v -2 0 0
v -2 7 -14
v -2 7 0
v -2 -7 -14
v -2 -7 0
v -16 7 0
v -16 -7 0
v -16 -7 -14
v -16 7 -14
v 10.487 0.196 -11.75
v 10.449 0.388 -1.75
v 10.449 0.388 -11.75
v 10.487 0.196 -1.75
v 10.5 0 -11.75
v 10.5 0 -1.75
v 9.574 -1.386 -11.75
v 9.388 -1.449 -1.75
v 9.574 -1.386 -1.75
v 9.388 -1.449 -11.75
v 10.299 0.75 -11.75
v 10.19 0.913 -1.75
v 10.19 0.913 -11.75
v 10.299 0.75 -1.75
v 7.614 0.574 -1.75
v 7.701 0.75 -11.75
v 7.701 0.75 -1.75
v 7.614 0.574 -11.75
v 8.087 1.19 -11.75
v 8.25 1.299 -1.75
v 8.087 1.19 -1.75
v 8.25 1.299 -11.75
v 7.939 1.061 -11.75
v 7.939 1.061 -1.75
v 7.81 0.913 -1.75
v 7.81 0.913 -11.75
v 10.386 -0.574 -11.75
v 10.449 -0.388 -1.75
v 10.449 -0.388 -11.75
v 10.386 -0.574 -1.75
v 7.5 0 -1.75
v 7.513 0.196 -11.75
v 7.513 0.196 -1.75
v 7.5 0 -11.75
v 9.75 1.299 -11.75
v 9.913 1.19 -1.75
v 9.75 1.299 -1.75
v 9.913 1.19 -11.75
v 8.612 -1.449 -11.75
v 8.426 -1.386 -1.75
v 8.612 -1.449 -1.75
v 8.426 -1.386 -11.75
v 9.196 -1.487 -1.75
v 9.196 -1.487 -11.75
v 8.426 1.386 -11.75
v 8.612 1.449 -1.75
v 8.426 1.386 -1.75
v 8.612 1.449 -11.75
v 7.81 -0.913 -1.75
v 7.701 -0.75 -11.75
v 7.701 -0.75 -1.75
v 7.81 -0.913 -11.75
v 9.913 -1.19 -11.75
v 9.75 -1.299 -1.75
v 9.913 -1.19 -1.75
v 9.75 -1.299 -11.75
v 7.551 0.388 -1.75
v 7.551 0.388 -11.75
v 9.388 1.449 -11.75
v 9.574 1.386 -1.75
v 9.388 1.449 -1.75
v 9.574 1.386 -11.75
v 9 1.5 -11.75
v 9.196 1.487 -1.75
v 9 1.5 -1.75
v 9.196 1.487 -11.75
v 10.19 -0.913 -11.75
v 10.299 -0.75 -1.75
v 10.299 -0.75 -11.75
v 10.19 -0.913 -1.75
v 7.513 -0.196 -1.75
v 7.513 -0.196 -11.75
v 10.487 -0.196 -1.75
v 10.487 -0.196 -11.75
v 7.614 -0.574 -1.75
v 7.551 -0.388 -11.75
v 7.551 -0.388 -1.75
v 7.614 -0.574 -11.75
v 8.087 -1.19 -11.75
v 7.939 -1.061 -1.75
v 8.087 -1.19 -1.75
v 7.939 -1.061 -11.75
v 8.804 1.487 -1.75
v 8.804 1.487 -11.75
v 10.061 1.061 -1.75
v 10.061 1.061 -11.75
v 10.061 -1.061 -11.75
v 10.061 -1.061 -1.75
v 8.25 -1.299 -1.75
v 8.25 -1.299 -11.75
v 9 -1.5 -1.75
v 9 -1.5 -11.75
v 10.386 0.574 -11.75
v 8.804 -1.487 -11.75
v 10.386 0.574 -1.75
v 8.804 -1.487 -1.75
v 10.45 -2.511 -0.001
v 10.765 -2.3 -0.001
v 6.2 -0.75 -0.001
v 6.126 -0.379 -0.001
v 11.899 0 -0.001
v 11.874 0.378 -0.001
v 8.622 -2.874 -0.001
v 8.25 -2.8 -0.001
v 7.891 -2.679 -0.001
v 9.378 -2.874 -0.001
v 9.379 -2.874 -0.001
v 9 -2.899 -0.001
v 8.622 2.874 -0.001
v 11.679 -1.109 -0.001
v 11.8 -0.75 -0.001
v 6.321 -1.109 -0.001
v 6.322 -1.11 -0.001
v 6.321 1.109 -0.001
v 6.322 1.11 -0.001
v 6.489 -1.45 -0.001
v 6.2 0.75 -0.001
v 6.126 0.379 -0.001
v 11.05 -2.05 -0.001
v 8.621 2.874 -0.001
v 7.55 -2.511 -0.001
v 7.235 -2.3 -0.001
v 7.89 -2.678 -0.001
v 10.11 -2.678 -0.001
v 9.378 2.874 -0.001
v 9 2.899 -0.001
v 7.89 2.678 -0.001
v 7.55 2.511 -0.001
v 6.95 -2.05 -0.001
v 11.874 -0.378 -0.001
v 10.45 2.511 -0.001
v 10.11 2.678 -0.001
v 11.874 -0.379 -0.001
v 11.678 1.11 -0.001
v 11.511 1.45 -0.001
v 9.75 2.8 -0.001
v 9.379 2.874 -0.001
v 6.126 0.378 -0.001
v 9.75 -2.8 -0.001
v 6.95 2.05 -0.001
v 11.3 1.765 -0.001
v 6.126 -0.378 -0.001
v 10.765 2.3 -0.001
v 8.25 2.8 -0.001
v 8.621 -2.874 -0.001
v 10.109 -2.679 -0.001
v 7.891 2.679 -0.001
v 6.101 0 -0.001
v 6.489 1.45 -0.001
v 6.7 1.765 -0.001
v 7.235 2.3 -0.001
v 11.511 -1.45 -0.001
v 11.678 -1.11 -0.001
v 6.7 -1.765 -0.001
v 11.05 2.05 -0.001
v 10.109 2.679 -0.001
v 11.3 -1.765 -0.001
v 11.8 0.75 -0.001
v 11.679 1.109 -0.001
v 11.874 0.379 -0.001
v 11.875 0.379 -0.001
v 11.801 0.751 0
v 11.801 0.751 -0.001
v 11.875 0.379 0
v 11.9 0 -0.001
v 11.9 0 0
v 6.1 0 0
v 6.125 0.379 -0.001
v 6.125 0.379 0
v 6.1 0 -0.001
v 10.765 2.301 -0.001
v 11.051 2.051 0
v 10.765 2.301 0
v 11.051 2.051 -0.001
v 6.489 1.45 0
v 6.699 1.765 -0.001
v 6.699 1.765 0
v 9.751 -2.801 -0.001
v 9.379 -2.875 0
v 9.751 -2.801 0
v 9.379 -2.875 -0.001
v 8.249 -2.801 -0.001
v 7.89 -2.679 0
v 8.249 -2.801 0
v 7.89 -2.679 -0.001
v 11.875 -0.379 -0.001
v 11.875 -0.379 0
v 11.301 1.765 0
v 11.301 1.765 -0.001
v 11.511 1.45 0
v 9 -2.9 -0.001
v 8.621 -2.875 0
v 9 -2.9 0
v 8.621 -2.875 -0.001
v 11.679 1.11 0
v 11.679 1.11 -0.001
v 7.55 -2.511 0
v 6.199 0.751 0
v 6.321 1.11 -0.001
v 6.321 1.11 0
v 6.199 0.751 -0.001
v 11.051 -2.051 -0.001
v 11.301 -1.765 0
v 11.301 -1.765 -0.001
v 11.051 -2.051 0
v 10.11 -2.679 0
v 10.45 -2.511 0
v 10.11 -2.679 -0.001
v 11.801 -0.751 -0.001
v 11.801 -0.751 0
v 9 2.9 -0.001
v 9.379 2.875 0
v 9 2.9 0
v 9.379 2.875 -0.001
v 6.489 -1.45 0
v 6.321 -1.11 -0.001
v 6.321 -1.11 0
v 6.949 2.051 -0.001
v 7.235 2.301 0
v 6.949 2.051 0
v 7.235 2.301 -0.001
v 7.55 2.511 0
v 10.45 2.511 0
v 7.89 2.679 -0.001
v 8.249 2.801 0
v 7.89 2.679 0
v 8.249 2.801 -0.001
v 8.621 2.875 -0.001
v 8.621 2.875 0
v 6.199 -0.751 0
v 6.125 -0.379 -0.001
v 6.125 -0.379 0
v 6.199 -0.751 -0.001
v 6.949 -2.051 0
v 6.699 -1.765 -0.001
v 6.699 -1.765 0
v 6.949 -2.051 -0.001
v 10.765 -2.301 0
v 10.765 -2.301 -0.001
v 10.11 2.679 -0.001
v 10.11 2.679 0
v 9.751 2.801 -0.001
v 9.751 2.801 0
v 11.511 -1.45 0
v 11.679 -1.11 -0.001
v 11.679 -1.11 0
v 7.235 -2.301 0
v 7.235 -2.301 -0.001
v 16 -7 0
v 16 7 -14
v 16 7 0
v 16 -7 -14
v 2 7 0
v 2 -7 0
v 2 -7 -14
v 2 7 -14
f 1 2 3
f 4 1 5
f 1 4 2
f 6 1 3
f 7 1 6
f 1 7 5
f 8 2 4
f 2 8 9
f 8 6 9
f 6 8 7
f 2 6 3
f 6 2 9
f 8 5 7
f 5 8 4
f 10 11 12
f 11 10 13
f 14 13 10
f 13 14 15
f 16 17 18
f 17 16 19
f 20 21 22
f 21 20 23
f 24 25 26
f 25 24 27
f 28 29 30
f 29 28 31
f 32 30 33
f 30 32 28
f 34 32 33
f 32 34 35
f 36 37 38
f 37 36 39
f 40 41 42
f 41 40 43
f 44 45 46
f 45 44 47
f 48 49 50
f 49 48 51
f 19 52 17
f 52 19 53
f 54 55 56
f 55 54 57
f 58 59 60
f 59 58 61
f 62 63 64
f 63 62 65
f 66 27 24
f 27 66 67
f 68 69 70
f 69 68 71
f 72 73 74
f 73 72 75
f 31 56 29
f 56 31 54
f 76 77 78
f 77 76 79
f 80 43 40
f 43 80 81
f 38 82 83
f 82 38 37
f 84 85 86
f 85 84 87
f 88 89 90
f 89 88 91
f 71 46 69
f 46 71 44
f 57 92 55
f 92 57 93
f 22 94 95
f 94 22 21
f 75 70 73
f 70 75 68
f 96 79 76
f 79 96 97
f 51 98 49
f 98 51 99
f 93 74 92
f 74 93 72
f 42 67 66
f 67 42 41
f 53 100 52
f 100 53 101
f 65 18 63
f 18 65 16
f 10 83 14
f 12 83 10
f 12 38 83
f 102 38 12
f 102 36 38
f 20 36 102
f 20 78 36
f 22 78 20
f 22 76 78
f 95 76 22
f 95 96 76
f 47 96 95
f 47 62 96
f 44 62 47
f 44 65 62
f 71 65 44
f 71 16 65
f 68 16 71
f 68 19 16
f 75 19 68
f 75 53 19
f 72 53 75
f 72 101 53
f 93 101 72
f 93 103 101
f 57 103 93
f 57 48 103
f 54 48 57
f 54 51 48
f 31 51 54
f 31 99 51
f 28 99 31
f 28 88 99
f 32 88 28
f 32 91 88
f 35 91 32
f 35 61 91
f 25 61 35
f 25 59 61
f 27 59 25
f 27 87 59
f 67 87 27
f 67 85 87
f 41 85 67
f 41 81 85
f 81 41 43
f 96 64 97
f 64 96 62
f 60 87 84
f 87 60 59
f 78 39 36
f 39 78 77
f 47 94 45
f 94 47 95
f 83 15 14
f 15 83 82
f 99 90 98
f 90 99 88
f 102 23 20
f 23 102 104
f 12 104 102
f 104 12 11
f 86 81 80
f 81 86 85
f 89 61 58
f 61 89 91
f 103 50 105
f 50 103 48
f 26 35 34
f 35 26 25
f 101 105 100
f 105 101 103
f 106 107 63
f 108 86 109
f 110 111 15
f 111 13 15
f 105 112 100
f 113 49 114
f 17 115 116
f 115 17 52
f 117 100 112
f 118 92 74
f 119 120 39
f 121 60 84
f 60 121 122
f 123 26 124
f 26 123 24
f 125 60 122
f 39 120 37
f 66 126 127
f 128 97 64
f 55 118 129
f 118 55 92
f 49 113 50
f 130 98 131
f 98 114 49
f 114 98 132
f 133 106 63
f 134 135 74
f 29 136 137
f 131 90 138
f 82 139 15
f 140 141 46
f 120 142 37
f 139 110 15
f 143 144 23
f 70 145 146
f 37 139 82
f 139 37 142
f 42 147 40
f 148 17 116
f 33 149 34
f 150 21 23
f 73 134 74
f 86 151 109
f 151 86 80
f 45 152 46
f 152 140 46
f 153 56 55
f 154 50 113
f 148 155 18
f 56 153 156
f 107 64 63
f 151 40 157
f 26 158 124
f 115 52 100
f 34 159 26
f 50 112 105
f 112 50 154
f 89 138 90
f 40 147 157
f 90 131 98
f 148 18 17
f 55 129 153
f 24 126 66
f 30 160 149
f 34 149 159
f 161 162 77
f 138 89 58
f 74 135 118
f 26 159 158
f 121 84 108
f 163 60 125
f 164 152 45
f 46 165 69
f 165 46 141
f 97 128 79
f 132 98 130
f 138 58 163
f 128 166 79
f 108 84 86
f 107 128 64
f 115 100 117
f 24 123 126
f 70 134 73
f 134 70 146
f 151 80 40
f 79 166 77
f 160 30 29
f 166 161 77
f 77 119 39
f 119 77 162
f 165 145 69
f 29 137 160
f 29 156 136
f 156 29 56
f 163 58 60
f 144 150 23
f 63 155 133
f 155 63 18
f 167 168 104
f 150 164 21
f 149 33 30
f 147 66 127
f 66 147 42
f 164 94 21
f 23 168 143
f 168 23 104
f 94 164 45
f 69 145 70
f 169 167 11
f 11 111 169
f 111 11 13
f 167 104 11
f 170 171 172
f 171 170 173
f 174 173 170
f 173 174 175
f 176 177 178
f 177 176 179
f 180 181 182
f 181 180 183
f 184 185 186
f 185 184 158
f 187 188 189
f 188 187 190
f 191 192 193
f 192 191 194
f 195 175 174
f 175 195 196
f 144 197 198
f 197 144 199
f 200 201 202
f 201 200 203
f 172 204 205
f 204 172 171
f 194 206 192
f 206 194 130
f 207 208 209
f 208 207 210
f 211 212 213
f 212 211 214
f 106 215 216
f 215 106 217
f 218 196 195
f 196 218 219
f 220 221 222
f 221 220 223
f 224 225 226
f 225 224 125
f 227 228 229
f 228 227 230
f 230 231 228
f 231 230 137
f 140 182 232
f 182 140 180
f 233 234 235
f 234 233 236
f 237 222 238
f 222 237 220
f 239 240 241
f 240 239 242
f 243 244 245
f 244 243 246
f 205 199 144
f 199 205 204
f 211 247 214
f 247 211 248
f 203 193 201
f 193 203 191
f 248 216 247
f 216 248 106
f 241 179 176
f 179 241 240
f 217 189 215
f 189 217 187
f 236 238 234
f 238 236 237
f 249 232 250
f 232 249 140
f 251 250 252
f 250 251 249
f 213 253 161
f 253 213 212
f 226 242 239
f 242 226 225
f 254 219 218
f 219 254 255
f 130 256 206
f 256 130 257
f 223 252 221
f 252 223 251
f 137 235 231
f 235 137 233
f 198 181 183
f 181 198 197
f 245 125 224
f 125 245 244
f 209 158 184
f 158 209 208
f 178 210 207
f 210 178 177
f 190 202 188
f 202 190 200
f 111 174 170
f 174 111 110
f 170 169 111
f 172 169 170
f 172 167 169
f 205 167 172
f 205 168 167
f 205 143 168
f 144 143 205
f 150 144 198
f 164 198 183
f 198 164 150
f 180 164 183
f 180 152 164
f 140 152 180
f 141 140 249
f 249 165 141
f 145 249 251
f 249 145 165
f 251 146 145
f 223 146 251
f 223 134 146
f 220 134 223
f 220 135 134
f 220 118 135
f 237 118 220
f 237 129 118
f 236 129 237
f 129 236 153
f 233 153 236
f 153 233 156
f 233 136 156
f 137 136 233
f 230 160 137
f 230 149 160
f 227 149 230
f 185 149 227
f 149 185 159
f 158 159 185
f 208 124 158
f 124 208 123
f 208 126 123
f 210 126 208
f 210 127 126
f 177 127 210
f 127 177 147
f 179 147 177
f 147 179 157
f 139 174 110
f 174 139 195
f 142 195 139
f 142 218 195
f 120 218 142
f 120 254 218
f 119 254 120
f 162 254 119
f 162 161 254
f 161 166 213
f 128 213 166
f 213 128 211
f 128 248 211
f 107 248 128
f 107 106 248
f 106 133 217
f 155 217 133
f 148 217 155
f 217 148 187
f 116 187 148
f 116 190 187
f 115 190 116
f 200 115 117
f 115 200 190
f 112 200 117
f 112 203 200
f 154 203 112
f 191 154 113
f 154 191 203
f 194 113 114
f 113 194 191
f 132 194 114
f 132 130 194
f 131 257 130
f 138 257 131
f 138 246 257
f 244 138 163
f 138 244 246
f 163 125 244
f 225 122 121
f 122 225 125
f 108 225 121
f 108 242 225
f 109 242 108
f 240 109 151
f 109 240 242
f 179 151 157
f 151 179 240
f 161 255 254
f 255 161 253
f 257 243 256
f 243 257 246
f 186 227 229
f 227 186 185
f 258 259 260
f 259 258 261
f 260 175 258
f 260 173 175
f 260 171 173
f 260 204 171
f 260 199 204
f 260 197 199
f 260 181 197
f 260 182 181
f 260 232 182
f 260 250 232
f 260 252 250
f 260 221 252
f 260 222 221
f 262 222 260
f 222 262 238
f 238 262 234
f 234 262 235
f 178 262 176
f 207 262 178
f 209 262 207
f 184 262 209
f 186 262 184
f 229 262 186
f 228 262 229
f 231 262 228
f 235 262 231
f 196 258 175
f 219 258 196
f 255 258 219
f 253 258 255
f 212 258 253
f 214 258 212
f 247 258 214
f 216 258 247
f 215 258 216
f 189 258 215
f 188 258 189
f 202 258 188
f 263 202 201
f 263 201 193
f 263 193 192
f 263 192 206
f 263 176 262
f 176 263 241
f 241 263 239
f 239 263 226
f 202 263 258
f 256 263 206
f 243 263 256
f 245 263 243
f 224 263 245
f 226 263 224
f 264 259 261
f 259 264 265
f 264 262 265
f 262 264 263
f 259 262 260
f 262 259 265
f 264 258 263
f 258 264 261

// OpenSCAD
// ============================================================
// Screw mounts — reusable brass-insert + screw-hole cutters
//
// Two negative-geometry modules, meant to be subtracted (difference())
// from a part.  They are the matched halves of one fastened joint:
//
//   insert_hole(size)        bore for a brass heat-set insert, pressed
//                            into the part that the screw threads INTO.
//   screw_hole(size, length) clearance hole in the COMPLEMENTARY part the
//                            screw passes THROUGH — exact screw-body bore
//                            that tapers out (countersink) into the head.
//
// `size` is "M2" or "M3".  Dimensions for the inserts match those already
// used in sight_housing.scad (M2: ø3.20 × 4.0; M3: ø4.00 × 5.0).
//
// Orientation convention (both modules):
//   The mouth of the hole sits at the LOCAL ORIGIN on the Z=0 plane and
//   the hole bores DOWNWARD into -Z, i.e. the fastener is imagined entering
//   from +Z.  Each cutter pokes +0.1 mm past Z=0 so the Boolean cleanly
//   breaks the surface.  translate()/rotate() the call to place it on the
//   real face, exactly like the bores in sight_housing.scad.
//
//   insert_hole : insert is pressed in from +Z; bore is +Z-deep into stock.
//   screw_hole  : head sits flush at Z=0 (countersunk), body bores to -Z.
// ============================================================

// ── Fastener table ───────────────────────────────────────────
// One row per screw size.  Head thickness is the user-specified value
// (M3 = 1.75 mm, M2 = 1.50 mm); head diameter is the user-specified
// countersunk flat-head OD (M3 = 5.8, M2 = 4.0).  Body diameter is the
// nominal thread OD — the screw hole uses this EXACTLY (see screw_hole()).
function screw_body_d(size) =
  size == "M3" ? 3.00 :
  size == "M2" ? 2.00 : undef;

function screw_head_d(size) =
  size == "M3" ? 5.80 :
  size == "M2" ? 4.00 : undef;

function screw_head_t(size) =
  size == "M3" ? 1.75 :
  size == "M2" ? 1.50 : undef;

// Brass heat-set insert bore (outer dia + length) — values shared with
// sight_housing.scad's insert_d / insert_depth (M2) and join_insert_d /
// join_insert_depth (M3).
function insert_bore_d(size) =
  size == "M3" ? 4.00 :
  size == "M2" ? 3.20 : undef;

function insert_bore_depth(size) =
  size == "M3" ? 5.00 :
  size == "M2" ? 4.00 : undef;

// ── Brass-insert bore ────────────────────────────────────────
// Pocket for a heat-set insert, pressed in from +Z.  Bores `depth` into
// -Z (default = the size's standard insert length) and pokes 0.1 mm past
// the Z=0 face so the cut breaks the surface cleanly.
//   depth : override the bore depth (mm).  Leave default for the standard
//           insert length.
module insert_hole(size, depth = undef) {
  d = insert_bore_d(size);
  h = depth == undef ? insert_bore_depth(size) : depth;
  translate([0, 0, -h])
    cylinder(d = d, h = h + 0.1);
}

// ── Screw clearance hole + head countersink ──────────────────
// Cut in the complementary part the screw passes THROUGH.  The straight
// bore is EXACTLY the screw-body diameter (plus optional `clearance`,
// default 0 — a true body-diameter hole as requested); the top
// screw_head_t(size) mm flares out as a cone from the body diameter up to
// the full head diameter, so a countersunk head seats flush at Z=0.
//   length    : straight body-bore length below the taper (mm).  Set to
//               the wall/material thickness the screw shank crosses; the
//               taper sits on top of this, the bore pokes 0.1 mm past the
//               far side for a clean break.
//   clearance : added to the body diameter (mm).  Default 0 = exact body
//               diameter.  Use e.g. 0.4 for a free-fit clearance hole.
module screw_hole(size, length, clearance = 0) {
  bd = screw_body_d(size) + clearance; // straight bore = exact body dia (+fit)
  hd = screw_head_d(size);             // countersink mouth = head dia
  ht = screw_head_t(size);             // taper height = head thickness

  union() {
    // straight body-clearance bore, hanging below the taper
    translate([0, 0, -(length + ht)])
      cylinder(d = bd, h = length + 0.1);
    // head countersink: cone flaring from body dia up to head dia
    translate([0, 0, -ht])
      cylinder(d1 = bd, d2 = hd, h = ht);
    // break the top surface above the head mouth
    translate([0, 0, -0.001])
      cylinder(d = hd, h = 0.1);
  }
}

// ── Straight clearance bore (no head) ────────────────────────
// Plain body-clearance hole the screw shank passes through (e.g. a bolt
// crossing a skirt/wall).  Mouth at Z=0, bores `length` into −Z with a +0.1 mm
// overshoot at the mouth to break the surface.
//   length : material thickness the shank crosses.
//   clear  : added to the screw-body diameter (default 0).
module clearance_hole(size, length, clear = 0) {
  translate([0, 0, -length])
    cylinder(d = screw_body_d(size) + clear, h = length + 0.1);
}

// ── Clearance bore + cylindrical socket-head counterbore ─────
// For a socket-head cap screw seated below a surface: a straight shank
// clearance bore through `length`, plus a flat-bottomed cylindrical recess
// (head_d × head_h) at the mouth.  Mouth at Z=0, bores into −Z, +0.1 mm
// overshoot on both bores.  head_d/head_h default to the size's flat-head
// table values; override for socket heads.
//   length : full thickness the shank crosses (the plate/lid).
//   clear  : added to the screw-body diameter for the shank (default 0).
module counterbore_hole(size, length, clear = 0, head_d = undef, head_h = undef) {
  hd = head_d == undef ? screw_head_d(size) : head_d;
  hh = head_h == undef ? screw_head_t(size) : head_h;
  union() {
    // shank clearance bore through the full length (+0.1 both ends)
    translate([0, 0, -(length + 0.1)])
      cylinder(d = screw_body_d(size) + clear, h = length + 0.2);
    // cylindrical head recess at the mouth
    translate([0, 0, -hh])
      cylinder(d = hd, h = hh + 0.1);
  }
}

// ── Demo (only renders when this file is opened directly; `use <>`
// imports the modules/functions above and ignores everything below) ──
$fn = 48;
demo_block = 14;
// left: a block with an M3 insert bore;  right: a block with an M3 screw
// hole, sliced so the countersink + body bore are visible.
difference() {
  translate([-demo_block - 2, -demo_block / 2, -demo_block])
    cube([demo_block, demo_block, demo_block]);
  insert_hole("M3");
}
difference() {
  translate([2, -demo_block / 2, -demo_block])
    cube([demo_block, demo_block, demo_block]);
  translate([2 + demo_block / 2, 0, 0])
    screw_hole("M3", demo_block - 4);
}
